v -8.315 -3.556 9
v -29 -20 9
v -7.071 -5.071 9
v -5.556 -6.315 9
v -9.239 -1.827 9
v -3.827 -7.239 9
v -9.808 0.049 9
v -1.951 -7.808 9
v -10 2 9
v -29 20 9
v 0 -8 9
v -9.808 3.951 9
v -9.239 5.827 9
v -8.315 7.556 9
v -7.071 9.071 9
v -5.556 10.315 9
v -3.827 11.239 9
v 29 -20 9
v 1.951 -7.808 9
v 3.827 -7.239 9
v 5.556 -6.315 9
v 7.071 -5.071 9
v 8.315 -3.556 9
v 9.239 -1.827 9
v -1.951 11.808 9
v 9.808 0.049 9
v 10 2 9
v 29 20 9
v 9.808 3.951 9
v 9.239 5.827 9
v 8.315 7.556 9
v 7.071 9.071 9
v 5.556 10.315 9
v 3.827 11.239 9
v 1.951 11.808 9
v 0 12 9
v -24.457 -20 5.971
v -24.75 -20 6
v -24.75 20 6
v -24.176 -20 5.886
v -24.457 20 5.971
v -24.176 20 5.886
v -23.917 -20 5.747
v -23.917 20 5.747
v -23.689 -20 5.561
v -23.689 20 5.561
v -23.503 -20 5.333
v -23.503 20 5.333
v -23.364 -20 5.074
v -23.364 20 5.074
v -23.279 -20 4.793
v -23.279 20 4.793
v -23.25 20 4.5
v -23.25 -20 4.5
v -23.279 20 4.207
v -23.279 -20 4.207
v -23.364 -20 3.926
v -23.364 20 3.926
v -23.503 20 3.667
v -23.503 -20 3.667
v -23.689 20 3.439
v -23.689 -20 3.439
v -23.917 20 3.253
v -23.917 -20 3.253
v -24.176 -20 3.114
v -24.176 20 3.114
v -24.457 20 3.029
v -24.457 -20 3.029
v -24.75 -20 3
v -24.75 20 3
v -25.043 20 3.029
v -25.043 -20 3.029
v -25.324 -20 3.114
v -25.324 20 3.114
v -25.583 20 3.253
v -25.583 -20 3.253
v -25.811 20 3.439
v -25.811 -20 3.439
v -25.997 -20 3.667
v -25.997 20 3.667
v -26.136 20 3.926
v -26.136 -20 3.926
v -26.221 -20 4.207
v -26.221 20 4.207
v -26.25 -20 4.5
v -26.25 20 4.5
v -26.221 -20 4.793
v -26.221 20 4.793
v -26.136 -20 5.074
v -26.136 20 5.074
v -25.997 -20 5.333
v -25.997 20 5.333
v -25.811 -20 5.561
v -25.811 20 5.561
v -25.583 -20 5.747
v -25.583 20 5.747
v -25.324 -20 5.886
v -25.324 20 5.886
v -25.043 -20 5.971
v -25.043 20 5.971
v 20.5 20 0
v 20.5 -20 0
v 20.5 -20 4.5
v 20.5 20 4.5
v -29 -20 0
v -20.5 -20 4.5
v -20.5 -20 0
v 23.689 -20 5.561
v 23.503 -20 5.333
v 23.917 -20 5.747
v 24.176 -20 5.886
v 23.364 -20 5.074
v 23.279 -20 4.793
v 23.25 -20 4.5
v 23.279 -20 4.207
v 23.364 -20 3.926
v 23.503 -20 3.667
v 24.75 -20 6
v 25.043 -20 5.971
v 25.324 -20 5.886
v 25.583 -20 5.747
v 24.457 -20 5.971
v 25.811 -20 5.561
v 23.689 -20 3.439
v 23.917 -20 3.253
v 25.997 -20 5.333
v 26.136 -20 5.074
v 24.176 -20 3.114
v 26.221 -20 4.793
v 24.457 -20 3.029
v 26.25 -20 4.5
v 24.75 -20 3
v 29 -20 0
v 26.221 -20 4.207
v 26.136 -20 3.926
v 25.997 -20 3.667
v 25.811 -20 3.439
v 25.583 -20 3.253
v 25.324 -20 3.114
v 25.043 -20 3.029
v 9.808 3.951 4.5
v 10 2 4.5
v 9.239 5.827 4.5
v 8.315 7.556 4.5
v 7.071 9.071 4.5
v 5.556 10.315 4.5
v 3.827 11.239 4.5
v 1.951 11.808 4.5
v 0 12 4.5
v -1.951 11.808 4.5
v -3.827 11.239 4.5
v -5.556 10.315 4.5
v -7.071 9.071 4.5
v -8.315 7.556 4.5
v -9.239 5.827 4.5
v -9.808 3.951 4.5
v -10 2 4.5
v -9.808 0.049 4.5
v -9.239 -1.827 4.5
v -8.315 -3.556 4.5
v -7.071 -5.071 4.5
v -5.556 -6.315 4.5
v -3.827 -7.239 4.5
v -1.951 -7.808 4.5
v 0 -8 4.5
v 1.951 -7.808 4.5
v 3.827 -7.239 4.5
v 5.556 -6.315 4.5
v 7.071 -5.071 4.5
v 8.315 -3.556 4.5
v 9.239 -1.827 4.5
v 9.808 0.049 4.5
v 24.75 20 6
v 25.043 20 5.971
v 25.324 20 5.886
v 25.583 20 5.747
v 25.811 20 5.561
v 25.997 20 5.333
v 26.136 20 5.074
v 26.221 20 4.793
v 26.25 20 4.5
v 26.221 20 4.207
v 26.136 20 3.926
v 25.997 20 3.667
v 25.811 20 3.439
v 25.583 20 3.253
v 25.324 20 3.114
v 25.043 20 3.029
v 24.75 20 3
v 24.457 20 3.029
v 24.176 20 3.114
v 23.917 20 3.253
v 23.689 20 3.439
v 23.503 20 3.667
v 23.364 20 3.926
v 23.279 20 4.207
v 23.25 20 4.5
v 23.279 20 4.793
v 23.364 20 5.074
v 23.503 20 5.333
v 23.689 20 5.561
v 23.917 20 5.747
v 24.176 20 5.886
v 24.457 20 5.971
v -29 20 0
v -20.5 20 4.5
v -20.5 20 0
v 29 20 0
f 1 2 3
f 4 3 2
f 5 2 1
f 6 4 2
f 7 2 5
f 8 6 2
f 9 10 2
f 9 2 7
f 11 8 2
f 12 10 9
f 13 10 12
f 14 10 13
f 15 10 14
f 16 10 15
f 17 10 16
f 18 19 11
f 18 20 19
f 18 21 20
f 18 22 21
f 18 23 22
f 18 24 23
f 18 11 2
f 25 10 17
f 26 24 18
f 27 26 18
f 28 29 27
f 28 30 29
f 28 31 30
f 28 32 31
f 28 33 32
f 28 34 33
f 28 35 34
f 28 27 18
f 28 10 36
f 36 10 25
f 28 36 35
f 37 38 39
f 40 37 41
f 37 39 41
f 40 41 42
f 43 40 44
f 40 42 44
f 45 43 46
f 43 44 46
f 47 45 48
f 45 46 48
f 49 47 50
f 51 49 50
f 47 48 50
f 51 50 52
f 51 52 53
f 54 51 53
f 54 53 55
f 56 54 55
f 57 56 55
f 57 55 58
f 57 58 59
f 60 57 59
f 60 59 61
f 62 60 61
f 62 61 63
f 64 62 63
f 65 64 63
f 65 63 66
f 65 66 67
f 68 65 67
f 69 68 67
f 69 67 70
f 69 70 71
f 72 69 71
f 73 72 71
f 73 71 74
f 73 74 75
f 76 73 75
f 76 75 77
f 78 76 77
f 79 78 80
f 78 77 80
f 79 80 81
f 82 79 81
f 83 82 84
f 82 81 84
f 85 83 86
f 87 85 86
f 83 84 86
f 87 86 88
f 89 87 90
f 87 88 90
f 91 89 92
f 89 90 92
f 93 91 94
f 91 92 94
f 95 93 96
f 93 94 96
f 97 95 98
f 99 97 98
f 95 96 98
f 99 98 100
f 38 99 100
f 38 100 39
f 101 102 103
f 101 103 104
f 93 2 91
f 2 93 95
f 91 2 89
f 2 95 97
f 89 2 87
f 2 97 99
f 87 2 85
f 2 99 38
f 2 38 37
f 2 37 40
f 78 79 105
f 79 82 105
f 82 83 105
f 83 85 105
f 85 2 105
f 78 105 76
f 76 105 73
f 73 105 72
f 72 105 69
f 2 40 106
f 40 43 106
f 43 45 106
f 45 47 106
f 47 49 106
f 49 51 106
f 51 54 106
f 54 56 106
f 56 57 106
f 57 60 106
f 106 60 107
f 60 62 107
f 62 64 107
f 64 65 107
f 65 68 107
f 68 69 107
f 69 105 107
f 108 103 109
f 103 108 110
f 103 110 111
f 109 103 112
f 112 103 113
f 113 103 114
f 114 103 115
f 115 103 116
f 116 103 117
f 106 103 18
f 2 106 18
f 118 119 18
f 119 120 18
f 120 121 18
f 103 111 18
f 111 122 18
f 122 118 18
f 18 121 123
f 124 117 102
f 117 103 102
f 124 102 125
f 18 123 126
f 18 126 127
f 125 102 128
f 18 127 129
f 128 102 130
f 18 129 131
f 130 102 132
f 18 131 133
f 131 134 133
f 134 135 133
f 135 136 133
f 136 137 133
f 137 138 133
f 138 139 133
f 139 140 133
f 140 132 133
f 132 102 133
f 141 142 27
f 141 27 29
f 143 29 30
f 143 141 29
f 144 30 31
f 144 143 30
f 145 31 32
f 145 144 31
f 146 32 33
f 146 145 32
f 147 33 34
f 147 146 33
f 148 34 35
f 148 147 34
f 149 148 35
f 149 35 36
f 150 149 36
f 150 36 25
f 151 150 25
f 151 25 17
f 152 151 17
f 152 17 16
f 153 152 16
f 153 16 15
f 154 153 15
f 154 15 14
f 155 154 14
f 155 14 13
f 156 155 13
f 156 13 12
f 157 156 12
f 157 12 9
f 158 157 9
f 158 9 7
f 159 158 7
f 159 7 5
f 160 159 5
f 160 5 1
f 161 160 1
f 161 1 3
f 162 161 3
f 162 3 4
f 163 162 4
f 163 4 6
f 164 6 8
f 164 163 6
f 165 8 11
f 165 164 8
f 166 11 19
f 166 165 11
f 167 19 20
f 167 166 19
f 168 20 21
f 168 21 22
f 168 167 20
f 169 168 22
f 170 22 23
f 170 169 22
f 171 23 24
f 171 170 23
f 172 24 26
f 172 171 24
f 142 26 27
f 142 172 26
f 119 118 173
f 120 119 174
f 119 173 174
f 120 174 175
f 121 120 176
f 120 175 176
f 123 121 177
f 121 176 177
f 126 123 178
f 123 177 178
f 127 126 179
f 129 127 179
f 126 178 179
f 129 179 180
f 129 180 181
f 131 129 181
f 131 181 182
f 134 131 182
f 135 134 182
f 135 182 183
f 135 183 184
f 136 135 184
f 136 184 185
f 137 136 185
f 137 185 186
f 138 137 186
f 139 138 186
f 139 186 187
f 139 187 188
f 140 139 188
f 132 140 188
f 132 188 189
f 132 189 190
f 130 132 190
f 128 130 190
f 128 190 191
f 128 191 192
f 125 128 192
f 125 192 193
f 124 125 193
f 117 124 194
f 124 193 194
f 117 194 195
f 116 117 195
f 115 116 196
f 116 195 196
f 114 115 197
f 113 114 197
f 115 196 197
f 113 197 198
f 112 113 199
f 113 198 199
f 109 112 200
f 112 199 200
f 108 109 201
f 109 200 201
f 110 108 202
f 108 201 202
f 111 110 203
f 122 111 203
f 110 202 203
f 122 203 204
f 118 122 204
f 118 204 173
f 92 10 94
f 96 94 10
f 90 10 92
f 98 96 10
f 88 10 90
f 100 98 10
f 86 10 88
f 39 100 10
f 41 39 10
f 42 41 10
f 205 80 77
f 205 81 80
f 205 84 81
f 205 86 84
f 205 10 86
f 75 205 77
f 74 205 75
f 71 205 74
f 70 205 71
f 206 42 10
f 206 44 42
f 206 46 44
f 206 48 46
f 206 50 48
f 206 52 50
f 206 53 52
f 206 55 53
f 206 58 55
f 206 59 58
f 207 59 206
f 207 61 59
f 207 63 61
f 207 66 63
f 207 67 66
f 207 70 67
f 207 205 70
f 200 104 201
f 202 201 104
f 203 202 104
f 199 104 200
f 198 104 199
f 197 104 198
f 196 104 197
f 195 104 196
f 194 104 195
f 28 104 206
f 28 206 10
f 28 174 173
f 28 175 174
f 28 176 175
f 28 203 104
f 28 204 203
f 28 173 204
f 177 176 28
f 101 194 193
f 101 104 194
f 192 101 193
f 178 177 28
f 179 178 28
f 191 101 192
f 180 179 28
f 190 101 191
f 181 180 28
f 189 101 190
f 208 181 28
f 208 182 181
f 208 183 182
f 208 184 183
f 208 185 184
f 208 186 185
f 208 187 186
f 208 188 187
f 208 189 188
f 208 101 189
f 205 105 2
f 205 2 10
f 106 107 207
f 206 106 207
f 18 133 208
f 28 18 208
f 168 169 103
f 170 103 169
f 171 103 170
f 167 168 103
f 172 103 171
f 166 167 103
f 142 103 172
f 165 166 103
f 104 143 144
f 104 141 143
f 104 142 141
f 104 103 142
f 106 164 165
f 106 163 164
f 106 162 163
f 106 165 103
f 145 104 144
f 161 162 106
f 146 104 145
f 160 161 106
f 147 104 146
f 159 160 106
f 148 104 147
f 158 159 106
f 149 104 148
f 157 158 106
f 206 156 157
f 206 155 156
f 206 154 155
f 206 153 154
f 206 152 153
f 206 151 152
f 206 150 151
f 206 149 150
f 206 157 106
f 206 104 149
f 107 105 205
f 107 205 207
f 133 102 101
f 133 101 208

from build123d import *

# Parameters (mm, degrees)
SKETCH1_W           = 58
SKETCH1_H           = 40
SKETCH1_R           = 10
BOSS_EXTRUDE1_DEPTH = 9
SKETCH2_W           = 41
SKETCH2_H           = 40
CUT_EXTRUDE1_DEPTH  = 4.5
SKETCH3_R           = 1.5
CUT_EXTRUDE2_DEPTH  = 51.219518118


with BuildPart() as part:
    # Sketch1 → Boss-Extrude1 (new body)
    with BuildSketch(Plane.XY):
        Rectangle(SKETCH1_W, SKETCH1_H)
        with Locations((0, 2)):
            Circle(SKETCH1_R, mode=Mode.SUBTRACT)
    extrude(amount=BOSS_EXTRUDE1_DEPTH)

    # Sketch2 → Cut-Extrude1 (cut)
    with BuildSketch(Plane(origin=(0, 0, 0), x_dir=(-1, 0, 0), z_dir=(0, 0, -1))):
        Rectangle(SKETCH2_W, SKETCH2_H)
    extrude(amount=-CUT_EXTRUDE1_DEPTH, mode=Mode.SUBTRACT)

    # Sketch3 → Cut-Extrude2 (cut, through all)
    with BuildSketch(Plane(origin=(0, 20, 0), x_dir=(1, 0, 0), z_dir=(0, 1, 0))):
        with Locations(Location((24.75, -4.5, 0), (0, 0, 270))):
            Circle(SKETCH3_R)
        with Locations(Location((-24.75, -4.5, 0), (0, 0, 270))):
            Circle(SKETCH3_R)
    extrude(amount=-CUT_EXTRUDE2_DEPTH, mode=Mode.SUBTRACT)


solid = part.part
